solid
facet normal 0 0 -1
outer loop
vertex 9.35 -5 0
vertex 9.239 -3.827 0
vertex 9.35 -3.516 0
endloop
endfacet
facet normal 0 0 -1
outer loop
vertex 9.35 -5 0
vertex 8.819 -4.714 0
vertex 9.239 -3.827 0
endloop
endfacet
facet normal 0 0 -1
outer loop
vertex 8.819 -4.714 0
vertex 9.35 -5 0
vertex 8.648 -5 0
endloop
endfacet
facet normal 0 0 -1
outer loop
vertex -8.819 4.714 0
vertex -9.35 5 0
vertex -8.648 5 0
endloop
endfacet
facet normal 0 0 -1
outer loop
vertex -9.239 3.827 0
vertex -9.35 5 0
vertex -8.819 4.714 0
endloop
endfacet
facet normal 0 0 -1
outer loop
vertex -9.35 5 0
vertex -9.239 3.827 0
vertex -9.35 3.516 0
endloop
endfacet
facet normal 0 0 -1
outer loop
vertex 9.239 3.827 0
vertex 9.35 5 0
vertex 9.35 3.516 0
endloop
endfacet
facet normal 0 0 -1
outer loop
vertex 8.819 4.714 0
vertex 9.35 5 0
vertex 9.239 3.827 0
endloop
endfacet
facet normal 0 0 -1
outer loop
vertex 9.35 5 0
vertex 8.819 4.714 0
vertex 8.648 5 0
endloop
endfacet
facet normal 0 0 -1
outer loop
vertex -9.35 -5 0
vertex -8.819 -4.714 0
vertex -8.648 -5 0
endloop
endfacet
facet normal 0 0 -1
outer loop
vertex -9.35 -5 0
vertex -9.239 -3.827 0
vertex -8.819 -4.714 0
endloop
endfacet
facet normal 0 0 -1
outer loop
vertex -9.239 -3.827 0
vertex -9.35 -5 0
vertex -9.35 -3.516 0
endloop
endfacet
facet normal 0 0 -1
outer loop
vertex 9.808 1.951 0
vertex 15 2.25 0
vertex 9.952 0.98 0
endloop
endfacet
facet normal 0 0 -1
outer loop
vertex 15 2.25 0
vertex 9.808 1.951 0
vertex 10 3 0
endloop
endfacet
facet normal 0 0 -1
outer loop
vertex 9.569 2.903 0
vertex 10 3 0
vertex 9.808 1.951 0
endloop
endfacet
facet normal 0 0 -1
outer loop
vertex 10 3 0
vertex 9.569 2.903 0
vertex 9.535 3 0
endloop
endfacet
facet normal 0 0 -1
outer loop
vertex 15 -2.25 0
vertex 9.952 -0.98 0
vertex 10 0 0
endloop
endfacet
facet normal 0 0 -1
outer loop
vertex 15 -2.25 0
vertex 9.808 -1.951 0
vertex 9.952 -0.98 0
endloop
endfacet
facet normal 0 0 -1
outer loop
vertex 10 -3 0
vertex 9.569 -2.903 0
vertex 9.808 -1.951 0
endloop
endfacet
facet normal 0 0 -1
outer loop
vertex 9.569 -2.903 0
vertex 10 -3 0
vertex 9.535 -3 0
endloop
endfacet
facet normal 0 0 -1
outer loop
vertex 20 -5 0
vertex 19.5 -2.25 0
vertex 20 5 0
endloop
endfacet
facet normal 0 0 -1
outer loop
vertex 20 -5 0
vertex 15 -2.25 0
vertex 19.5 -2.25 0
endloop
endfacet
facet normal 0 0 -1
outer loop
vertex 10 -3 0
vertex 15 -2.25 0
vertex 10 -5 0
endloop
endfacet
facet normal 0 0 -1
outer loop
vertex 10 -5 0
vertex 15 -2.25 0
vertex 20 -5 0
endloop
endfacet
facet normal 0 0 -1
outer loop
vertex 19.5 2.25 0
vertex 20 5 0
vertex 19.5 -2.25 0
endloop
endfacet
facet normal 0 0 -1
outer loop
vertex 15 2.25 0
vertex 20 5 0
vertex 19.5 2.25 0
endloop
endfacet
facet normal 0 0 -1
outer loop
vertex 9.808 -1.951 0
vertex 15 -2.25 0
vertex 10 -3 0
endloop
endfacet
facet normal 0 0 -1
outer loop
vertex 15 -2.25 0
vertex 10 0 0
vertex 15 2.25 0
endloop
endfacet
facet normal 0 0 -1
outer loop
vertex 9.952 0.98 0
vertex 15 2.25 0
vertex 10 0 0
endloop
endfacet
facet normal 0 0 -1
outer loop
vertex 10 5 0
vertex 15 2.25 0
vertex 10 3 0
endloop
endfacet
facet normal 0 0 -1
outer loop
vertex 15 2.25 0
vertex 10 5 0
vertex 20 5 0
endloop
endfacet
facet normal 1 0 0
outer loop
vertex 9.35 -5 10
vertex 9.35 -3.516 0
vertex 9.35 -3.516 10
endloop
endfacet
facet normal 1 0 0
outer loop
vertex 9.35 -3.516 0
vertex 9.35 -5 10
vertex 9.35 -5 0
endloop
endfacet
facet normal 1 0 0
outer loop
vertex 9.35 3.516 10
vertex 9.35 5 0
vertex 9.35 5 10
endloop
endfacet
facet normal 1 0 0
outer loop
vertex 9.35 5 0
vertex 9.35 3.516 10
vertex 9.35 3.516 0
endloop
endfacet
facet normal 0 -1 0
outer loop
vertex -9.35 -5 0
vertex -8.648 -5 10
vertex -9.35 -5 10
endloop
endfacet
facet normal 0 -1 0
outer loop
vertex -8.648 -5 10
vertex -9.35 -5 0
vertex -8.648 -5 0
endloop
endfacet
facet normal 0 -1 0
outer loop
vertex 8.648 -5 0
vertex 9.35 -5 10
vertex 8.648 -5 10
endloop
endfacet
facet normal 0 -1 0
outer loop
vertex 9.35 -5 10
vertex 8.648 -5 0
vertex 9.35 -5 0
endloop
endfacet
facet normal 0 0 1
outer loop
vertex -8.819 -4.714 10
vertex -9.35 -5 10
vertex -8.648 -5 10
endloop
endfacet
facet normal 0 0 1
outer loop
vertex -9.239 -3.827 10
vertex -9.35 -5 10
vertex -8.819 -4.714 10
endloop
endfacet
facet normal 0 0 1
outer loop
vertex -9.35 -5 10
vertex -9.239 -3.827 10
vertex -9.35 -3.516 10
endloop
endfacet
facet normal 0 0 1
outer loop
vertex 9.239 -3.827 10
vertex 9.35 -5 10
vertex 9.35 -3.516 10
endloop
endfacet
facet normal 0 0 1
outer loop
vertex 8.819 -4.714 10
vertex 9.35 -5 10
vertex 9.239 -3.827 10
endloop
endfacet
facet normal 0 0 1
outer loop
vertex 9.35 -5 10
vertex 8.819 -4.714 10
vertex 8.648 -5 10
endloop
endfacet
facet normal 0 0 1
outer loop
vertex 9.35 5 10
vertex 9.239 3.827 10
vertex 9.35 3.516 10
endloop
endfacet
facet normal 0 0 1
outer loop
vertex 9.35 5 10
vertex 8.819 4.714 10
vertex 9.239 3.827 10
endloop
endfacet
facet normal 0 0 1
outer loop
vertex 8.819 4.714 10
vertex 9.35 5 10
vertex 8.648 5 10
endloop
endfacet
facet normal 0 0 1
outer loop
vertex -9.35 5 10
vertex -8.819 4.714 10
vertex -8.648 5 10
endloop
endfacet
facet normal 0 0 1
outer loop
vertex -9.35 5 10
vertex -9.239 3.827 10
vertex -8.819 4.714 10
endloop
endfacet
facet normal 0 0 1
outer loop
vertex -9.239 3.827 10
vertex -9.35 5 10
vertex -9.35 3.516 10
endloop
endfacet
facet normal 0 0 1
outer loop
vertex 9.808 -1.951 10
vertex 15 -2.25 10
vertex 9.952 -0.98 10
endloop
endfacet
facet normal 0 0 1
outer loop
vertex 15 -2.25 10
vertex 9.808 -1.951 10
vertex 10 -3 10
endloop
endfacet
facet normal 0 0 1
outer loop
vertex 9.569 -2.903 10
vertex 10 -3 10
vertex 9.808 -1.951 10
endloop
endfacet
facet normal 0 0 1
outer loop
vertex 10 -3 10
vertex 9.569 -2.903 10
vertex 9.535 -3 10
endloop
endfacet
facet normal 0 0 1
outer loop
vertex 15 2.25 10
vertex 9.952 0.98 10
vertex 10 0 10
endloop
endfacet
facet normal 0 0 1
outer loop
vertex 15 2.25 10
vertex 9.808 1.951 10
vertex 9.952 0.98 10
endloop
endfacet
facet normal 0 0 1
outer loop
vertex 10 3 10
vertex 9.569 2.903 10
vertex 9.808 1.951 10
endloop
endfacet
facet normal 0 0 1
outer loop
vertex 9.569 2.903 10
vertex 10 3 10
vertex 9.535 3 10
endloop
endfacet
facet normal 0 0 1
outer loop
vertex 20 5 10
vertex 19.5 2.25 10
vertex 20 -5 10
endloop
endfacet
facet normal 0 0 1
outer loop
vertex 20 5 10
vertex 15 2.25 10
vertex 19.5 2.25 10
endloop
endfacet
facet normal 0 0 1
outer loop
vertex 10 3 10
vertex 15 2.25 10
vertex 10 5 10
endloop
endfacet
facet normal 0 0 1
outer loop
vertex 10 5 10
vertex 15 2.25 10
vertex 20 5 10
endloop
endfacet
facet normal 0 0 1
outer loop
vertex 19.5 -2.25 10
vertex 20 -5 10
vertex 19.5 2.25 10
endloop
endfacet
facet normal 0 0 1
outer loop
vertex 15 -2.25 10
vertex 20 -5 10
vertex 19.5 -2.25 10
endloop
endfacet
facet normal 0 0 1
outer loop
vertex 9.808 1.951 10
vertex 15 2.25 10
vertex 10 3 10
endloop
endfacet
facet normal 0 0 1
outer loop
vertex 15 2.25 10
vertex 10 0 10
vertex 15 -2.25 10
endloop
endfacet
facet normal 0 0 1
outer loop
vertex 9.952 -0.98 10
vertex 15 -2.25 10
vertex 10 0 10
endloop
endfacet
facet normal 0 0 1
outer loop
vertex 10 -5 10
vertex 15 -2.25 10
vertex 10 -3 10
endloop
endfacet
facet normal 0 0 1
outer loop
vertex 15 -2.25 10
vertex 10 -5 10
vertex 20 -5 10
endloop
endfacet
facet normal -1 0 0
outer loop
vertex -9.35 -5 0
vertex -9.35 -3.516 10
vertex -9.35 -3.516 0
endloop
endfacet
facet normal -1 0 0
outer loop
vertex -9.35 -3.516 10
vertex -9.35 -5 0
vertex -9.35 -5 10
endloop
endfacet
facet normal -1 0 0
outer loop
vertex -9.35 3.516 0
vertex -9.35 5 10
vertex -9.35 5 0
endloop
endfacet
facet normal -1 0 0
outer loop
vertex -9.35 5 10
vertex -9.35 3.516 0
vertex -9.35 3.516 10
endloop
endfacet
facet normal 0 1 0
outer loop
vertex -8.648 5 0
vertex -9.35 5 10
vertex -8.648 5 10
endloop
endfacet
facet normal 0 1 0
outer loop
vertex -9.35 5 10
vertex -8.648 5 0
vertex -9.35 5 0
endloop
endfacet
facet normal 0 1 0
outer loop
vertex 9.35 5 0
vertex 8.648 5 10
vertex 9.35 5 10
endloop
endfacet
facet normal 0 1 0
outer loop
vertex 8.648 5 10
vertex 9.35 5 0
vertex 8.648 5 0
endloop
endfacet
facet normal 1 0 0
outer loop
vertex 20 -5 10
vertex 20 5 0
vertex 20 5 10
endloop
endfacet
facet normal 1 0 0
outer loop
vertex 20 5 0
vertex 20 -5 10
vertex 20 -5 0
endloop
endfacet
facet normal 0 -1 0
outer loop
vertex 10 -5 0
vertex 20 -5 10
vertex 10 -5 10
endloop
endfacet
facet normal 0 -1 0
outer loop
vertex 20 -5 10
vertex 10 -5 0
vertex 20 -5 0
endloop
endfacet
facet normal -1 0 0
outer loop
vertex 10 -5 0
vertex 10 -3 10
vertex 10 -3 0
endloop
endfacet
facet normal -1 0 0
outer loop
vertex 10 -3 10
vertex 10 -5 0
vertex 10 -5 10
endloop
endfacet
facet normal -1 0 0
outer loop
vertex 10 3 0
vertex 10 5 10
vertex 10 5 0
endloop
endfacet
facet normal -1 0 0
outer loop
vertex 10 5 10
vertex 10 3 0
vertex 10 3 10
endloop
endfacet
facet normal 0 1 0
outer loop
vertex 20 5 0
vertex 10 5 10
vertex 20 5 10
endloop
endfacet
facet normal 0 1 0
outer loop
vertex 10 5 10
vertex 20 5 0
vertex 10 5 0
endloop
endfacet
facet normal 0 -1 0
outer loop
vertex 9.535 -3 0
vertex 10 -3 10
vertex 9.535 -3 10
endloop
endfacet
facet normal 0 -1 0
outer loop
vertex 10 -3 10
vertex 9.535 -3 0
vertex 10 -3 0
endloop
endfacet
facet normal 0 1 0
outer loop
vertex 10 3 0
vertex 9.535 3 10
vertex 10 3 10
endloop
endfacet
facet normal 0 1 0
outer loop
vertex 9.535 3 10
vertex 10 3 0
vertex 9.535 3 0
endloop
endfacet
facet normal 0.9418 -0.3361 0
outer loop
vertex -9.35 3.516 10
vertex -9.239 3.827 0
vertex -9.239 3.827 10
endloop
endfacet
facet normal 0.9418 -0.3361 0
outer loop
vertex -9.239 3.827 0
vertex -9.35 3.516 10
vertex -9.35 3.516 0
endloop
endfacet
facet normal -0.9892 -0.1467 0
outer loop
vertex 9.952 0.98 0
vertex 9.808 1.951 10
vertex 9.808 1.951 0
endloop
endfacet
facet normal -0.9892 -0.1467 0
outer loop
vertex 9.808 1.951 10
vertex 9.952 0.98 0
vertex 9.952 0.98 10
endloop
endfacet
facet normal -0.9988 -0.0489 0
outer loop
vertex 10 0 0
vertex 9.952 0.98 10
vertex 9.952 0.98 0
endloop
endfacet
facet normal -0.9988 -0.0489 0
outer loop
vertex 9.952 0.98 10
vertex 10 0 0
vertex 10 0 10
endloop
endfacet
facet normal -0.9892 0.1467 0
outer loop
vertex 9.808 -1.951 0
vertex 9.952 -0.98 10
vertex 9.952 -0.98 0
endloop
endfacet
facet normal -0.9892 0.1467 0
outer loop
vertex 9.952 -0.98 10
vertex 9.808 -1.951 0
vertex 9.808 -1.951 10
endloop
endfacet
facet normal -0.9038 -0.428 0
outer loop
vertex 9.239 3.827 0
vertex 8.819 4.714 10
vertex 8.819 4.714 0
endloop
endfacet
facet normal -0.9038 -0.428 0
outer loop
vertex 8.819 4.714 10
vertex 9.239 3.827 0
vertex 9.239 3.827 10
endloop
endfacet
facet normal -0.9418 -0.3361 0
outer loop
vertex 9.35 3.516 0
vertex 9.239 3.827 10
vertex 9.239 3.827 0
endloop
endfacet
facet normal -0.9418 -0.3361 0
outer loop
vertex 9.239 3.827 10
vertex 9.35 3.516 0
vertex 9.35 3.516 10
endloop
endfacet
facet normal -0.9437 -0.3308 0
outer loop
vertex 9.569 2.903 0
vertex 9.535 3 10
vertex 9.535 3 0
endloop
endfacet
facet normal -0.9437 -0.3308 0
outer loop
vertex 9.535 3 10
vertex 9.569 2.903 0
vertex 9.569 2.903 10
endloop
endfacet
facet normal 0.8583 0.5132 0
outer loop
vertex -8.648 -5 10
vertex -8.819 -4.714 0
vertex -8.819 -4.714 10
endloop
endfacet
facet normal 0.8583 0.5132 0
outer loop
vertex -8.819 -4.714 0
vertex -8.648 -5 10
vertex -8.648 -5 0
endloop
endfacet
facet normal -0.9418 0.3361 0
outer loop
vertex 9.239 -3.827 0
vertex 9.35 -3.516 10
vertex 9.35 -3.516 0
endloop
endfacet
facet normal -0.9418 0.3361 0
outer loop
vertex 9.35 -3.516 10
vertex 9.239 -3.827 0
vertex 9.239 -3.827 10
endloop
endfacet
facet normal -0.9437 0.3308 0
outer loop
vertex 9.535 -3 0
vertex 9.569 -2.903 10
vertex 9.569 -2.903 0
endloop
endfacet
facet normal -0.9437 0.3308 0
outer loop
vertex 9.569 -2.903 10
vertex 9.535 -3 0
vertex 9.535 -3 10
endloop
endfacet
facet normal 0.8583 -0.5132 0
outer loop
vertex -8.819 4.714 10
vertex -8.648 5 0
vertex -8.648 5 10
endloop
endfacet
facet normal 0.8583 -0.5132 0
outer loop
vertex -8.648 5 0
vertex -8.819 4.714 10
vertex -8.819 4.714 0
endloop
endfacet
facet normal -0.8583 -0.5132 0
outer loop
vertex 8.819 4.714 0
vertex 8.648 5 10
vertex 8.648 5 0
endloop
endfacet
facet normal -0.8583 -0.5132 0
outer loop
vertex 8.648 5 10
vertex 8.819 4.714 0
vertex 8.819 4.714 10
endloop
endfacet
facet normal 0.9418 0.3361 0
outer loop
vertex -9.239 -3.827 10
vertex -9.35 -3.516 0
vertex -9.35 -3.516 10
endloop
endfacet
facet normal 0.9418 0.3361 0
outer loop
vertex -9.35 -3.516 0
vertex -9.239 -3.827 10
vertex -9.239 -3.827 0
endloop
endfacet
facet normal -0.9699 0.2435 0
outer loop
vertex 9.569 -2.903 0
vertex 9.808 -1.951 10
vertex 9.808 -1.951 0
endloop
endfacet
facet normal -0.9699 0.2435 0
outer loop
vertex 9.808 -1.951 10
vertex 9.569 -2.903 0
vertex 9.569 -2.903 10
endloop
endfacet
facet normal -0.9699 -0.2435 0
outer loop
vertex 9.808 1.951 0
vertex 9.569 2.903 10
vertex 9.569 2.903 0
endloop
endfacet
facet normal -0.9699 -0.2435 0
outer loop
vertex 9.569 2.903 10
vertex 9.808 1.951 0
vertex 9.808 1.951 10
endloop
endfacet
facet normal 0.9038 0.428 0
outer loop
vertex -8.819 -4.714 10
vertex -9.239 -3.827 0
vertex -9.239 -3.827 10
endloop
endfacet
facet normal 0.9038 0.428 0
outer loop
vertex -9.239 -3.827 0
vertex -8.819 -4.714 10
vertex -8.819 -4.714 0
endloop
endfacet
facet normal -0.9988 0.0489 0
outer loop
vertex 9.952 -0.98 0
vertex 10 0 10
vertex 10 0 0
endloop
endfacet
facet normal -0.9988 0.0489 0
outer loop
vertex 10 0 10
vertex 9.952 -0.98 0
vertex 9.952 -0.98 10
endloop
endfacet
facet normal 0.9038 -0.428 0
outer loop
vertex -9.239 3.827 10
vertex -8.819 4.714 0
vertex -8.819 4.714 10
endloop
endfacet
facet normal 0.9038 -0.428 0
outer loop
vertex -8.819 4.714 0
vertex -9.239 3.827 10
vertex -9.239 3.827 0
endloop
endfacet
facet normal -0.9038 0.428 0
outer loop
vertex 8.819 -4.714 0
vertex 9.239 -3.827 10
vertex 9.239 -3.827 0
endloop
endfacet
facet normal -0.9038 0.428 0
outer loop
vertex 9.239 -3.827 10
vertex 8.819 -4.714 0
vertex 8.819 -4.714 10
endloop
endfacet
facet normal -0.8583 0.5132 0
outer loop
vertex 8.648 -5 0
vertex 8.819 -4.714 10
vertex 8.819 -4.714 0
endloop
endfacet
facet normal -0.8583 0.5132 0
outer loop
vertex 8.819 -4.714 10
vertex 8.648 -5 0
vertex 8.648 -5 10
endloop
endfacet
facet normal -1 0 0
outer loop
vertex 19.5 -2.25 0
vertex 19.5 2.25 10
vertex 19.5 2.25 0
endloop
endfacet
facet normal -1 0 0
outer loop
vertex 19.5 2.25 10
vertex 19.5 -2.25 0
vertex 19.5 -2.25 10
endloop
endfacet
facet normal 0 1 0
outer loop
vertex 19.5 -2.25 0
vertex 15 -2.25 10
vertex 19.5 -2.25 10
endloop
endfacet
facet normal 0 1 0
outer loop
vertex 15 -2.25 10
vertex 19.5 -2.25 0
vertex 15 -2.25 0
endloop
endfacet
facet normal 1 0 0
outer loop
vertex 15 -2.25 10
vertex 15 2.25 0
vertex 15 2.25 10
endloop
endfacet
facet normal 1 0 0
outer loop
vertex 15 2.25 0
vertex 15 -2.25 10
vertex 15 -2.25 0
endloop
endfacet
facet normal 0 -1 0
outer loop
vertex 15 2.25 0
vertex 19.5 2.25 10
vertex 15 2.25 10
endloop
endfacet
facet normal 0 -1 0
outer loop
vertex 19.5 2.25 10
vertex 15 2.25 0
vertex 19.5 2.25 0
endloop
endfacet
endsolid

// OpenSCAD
// Snap-on clip for lab stand rod and tubing.
// Printed flat: 10 mm tall extrusion of a 2-D profile in the XY plane.
// Orientation: Rests on XY plane at Z=0, builds upward. Centred on origin.

// Rod dimensions
rod_id = 12.7;      // Inner diameter of rod ring
rod_wall = 3;       // Wall thickness of rod ring
rod_od = rod_id + 2 * rod_wall; // Outer diameter of rod ring (18.7 mm)

// Tubing dimensions
tube_id = 6;        // Inner diameter of tubing ring
tube_wall = 2;      // Wall thickness of tubing ring
tube_od = tube_id + 2 * tube_wall; // Outer diameter of tubing ring (10 mm)

// Bridge dimensions
bridge_x_start = 8; // Start X of bridge
bridge_x_end = 12;  // End X of bridge
bridge_y = 6;       // Width of bridge in Y

// Extrusion height
height = 10;

// Cutout dimensions for rod ring (opening on -X side)
cutout_rod_y_min = -5;
cutout_rod_y_max = 5;
cutout_rod_width = 10; // Width of the gap (from x = -5 to x = 5)

// Cutout dimensions for tubing ring (opening on +X side)
cutout_tube_y_min = -2.25;
cutout_tube_y_max = 2.25;
cutout_tube_width = 4.5; // Width of the gap (from x = 15 to x = 19.5)

$fn = 64;

// Define the 2D profile as a polygon in the XY plane
// Points are listed as [x, y]. The profile is closed by connecting the last point to the first.
// We construct the outer boundary and then subtract the cutouts and the bridge void.

// Helper to generate points for a rectangle centered at (cx, cy) with width w and height h
// Returns a list of [x, y] points.
function rect_points(cx, cy, w, h) = [
    [cx - w/2, cy - h/2],
    [cx + w/2, cy - h/2],
    [cx + w/2, cy + h/2],
    [cx - w/2, cy + h/2]
];

// Helper to generate points for a rectangle defined by x-range [x1, x2] and y-range [y1, y2]
function rect_xy_points(x1, y1, x2, y2) = [
    [x1, y1],
    [x2, y1],
    [x2, y2],
    [x1, y2]
];

// Construct the main body polygon
// 1. Outer Rod Ring (Centered at 0,0, OD=18.7)
// 2. Outer Tubing Ring (Centered at 15,0, OD=10)
// 3. Bridge (Rectangle from x=8 to x=12, y=-3 to y=3)
// Note: The bridge is solid, so we just add its area. The rings are added.
// Then we subtract the cutouts.

// Let's build the union of the three solid shapes first, then subtract the cutouts.
// Since we are using linear_extrude, we can define the 2D shape as a union of polygons.

// Rod Ring Outer
rod_ring_outer = rect_points(0, 0, rod_od, height);

// Tubing Ring Outer
tube_ring_outer = rect_points(15, 0, tube_od, height);

// Bridge
bridge_poly = rect_xy_points(bridge_x_start, -bridge_y/2, bridge_x_end, bridge_y/2);

// Cutout 1: Rod Ring Opening (-X side)
// Defined as x < 0 and -5 < y < 5.
// We need to cut a rectangle from x = -5 to x = 0, y = -5 to y = 5.
cutout_rod = rect_xy_points(-cutout_rod_width/2, cutout_rod_y_min, 0, cutout_rod_y_max);

// Cutout 2: Tubing Ring Opening (+X side)
// Defined as x > 15 and -2.25 < y < 2.25.
// We need to cut a rectangle from x = 15 to x = 19.5, y = -2.25 to y = 2.25.
cutout_tube = rect_xy_points(15, cutout_tube_y_min, 15 + cutout_tube_width, cutout_tube_y_max);

// Create the 2D profile
// Union of Rod Ring, Tubing Ring, and Bridge
// Difference with Cutouts

difference() {
    union() {
        // Rod Ring
        linear_extrude(height = height) polygon(rod_ring_outer);
        
        // Tubing Ring
        linear_extrude(height = height) polygon(tube_ring_outer);
        
        // Bridge
        linear_extrude(height = height) polygon(bridge_poly);
    }
    
    // Subtract Cutouts
    // Extend cutouts slightly to ensure clean cuts
    translate([0, 0, -0.01]) cylinder(h = height + 0.02, d = 20); // Dummy to ensure Z coverage if needed, but polygons are 2D
    
    // Cutout Rod
    translate([0, 0, -0.01]) linear_extrude(height = height + 0.02) polygon(cutout_rod);
    
    // Cutout Tube
    translate([0, 0, -0.01]) linear_extrude(height = height + 0.02) polygon(cutout_tube);
}
